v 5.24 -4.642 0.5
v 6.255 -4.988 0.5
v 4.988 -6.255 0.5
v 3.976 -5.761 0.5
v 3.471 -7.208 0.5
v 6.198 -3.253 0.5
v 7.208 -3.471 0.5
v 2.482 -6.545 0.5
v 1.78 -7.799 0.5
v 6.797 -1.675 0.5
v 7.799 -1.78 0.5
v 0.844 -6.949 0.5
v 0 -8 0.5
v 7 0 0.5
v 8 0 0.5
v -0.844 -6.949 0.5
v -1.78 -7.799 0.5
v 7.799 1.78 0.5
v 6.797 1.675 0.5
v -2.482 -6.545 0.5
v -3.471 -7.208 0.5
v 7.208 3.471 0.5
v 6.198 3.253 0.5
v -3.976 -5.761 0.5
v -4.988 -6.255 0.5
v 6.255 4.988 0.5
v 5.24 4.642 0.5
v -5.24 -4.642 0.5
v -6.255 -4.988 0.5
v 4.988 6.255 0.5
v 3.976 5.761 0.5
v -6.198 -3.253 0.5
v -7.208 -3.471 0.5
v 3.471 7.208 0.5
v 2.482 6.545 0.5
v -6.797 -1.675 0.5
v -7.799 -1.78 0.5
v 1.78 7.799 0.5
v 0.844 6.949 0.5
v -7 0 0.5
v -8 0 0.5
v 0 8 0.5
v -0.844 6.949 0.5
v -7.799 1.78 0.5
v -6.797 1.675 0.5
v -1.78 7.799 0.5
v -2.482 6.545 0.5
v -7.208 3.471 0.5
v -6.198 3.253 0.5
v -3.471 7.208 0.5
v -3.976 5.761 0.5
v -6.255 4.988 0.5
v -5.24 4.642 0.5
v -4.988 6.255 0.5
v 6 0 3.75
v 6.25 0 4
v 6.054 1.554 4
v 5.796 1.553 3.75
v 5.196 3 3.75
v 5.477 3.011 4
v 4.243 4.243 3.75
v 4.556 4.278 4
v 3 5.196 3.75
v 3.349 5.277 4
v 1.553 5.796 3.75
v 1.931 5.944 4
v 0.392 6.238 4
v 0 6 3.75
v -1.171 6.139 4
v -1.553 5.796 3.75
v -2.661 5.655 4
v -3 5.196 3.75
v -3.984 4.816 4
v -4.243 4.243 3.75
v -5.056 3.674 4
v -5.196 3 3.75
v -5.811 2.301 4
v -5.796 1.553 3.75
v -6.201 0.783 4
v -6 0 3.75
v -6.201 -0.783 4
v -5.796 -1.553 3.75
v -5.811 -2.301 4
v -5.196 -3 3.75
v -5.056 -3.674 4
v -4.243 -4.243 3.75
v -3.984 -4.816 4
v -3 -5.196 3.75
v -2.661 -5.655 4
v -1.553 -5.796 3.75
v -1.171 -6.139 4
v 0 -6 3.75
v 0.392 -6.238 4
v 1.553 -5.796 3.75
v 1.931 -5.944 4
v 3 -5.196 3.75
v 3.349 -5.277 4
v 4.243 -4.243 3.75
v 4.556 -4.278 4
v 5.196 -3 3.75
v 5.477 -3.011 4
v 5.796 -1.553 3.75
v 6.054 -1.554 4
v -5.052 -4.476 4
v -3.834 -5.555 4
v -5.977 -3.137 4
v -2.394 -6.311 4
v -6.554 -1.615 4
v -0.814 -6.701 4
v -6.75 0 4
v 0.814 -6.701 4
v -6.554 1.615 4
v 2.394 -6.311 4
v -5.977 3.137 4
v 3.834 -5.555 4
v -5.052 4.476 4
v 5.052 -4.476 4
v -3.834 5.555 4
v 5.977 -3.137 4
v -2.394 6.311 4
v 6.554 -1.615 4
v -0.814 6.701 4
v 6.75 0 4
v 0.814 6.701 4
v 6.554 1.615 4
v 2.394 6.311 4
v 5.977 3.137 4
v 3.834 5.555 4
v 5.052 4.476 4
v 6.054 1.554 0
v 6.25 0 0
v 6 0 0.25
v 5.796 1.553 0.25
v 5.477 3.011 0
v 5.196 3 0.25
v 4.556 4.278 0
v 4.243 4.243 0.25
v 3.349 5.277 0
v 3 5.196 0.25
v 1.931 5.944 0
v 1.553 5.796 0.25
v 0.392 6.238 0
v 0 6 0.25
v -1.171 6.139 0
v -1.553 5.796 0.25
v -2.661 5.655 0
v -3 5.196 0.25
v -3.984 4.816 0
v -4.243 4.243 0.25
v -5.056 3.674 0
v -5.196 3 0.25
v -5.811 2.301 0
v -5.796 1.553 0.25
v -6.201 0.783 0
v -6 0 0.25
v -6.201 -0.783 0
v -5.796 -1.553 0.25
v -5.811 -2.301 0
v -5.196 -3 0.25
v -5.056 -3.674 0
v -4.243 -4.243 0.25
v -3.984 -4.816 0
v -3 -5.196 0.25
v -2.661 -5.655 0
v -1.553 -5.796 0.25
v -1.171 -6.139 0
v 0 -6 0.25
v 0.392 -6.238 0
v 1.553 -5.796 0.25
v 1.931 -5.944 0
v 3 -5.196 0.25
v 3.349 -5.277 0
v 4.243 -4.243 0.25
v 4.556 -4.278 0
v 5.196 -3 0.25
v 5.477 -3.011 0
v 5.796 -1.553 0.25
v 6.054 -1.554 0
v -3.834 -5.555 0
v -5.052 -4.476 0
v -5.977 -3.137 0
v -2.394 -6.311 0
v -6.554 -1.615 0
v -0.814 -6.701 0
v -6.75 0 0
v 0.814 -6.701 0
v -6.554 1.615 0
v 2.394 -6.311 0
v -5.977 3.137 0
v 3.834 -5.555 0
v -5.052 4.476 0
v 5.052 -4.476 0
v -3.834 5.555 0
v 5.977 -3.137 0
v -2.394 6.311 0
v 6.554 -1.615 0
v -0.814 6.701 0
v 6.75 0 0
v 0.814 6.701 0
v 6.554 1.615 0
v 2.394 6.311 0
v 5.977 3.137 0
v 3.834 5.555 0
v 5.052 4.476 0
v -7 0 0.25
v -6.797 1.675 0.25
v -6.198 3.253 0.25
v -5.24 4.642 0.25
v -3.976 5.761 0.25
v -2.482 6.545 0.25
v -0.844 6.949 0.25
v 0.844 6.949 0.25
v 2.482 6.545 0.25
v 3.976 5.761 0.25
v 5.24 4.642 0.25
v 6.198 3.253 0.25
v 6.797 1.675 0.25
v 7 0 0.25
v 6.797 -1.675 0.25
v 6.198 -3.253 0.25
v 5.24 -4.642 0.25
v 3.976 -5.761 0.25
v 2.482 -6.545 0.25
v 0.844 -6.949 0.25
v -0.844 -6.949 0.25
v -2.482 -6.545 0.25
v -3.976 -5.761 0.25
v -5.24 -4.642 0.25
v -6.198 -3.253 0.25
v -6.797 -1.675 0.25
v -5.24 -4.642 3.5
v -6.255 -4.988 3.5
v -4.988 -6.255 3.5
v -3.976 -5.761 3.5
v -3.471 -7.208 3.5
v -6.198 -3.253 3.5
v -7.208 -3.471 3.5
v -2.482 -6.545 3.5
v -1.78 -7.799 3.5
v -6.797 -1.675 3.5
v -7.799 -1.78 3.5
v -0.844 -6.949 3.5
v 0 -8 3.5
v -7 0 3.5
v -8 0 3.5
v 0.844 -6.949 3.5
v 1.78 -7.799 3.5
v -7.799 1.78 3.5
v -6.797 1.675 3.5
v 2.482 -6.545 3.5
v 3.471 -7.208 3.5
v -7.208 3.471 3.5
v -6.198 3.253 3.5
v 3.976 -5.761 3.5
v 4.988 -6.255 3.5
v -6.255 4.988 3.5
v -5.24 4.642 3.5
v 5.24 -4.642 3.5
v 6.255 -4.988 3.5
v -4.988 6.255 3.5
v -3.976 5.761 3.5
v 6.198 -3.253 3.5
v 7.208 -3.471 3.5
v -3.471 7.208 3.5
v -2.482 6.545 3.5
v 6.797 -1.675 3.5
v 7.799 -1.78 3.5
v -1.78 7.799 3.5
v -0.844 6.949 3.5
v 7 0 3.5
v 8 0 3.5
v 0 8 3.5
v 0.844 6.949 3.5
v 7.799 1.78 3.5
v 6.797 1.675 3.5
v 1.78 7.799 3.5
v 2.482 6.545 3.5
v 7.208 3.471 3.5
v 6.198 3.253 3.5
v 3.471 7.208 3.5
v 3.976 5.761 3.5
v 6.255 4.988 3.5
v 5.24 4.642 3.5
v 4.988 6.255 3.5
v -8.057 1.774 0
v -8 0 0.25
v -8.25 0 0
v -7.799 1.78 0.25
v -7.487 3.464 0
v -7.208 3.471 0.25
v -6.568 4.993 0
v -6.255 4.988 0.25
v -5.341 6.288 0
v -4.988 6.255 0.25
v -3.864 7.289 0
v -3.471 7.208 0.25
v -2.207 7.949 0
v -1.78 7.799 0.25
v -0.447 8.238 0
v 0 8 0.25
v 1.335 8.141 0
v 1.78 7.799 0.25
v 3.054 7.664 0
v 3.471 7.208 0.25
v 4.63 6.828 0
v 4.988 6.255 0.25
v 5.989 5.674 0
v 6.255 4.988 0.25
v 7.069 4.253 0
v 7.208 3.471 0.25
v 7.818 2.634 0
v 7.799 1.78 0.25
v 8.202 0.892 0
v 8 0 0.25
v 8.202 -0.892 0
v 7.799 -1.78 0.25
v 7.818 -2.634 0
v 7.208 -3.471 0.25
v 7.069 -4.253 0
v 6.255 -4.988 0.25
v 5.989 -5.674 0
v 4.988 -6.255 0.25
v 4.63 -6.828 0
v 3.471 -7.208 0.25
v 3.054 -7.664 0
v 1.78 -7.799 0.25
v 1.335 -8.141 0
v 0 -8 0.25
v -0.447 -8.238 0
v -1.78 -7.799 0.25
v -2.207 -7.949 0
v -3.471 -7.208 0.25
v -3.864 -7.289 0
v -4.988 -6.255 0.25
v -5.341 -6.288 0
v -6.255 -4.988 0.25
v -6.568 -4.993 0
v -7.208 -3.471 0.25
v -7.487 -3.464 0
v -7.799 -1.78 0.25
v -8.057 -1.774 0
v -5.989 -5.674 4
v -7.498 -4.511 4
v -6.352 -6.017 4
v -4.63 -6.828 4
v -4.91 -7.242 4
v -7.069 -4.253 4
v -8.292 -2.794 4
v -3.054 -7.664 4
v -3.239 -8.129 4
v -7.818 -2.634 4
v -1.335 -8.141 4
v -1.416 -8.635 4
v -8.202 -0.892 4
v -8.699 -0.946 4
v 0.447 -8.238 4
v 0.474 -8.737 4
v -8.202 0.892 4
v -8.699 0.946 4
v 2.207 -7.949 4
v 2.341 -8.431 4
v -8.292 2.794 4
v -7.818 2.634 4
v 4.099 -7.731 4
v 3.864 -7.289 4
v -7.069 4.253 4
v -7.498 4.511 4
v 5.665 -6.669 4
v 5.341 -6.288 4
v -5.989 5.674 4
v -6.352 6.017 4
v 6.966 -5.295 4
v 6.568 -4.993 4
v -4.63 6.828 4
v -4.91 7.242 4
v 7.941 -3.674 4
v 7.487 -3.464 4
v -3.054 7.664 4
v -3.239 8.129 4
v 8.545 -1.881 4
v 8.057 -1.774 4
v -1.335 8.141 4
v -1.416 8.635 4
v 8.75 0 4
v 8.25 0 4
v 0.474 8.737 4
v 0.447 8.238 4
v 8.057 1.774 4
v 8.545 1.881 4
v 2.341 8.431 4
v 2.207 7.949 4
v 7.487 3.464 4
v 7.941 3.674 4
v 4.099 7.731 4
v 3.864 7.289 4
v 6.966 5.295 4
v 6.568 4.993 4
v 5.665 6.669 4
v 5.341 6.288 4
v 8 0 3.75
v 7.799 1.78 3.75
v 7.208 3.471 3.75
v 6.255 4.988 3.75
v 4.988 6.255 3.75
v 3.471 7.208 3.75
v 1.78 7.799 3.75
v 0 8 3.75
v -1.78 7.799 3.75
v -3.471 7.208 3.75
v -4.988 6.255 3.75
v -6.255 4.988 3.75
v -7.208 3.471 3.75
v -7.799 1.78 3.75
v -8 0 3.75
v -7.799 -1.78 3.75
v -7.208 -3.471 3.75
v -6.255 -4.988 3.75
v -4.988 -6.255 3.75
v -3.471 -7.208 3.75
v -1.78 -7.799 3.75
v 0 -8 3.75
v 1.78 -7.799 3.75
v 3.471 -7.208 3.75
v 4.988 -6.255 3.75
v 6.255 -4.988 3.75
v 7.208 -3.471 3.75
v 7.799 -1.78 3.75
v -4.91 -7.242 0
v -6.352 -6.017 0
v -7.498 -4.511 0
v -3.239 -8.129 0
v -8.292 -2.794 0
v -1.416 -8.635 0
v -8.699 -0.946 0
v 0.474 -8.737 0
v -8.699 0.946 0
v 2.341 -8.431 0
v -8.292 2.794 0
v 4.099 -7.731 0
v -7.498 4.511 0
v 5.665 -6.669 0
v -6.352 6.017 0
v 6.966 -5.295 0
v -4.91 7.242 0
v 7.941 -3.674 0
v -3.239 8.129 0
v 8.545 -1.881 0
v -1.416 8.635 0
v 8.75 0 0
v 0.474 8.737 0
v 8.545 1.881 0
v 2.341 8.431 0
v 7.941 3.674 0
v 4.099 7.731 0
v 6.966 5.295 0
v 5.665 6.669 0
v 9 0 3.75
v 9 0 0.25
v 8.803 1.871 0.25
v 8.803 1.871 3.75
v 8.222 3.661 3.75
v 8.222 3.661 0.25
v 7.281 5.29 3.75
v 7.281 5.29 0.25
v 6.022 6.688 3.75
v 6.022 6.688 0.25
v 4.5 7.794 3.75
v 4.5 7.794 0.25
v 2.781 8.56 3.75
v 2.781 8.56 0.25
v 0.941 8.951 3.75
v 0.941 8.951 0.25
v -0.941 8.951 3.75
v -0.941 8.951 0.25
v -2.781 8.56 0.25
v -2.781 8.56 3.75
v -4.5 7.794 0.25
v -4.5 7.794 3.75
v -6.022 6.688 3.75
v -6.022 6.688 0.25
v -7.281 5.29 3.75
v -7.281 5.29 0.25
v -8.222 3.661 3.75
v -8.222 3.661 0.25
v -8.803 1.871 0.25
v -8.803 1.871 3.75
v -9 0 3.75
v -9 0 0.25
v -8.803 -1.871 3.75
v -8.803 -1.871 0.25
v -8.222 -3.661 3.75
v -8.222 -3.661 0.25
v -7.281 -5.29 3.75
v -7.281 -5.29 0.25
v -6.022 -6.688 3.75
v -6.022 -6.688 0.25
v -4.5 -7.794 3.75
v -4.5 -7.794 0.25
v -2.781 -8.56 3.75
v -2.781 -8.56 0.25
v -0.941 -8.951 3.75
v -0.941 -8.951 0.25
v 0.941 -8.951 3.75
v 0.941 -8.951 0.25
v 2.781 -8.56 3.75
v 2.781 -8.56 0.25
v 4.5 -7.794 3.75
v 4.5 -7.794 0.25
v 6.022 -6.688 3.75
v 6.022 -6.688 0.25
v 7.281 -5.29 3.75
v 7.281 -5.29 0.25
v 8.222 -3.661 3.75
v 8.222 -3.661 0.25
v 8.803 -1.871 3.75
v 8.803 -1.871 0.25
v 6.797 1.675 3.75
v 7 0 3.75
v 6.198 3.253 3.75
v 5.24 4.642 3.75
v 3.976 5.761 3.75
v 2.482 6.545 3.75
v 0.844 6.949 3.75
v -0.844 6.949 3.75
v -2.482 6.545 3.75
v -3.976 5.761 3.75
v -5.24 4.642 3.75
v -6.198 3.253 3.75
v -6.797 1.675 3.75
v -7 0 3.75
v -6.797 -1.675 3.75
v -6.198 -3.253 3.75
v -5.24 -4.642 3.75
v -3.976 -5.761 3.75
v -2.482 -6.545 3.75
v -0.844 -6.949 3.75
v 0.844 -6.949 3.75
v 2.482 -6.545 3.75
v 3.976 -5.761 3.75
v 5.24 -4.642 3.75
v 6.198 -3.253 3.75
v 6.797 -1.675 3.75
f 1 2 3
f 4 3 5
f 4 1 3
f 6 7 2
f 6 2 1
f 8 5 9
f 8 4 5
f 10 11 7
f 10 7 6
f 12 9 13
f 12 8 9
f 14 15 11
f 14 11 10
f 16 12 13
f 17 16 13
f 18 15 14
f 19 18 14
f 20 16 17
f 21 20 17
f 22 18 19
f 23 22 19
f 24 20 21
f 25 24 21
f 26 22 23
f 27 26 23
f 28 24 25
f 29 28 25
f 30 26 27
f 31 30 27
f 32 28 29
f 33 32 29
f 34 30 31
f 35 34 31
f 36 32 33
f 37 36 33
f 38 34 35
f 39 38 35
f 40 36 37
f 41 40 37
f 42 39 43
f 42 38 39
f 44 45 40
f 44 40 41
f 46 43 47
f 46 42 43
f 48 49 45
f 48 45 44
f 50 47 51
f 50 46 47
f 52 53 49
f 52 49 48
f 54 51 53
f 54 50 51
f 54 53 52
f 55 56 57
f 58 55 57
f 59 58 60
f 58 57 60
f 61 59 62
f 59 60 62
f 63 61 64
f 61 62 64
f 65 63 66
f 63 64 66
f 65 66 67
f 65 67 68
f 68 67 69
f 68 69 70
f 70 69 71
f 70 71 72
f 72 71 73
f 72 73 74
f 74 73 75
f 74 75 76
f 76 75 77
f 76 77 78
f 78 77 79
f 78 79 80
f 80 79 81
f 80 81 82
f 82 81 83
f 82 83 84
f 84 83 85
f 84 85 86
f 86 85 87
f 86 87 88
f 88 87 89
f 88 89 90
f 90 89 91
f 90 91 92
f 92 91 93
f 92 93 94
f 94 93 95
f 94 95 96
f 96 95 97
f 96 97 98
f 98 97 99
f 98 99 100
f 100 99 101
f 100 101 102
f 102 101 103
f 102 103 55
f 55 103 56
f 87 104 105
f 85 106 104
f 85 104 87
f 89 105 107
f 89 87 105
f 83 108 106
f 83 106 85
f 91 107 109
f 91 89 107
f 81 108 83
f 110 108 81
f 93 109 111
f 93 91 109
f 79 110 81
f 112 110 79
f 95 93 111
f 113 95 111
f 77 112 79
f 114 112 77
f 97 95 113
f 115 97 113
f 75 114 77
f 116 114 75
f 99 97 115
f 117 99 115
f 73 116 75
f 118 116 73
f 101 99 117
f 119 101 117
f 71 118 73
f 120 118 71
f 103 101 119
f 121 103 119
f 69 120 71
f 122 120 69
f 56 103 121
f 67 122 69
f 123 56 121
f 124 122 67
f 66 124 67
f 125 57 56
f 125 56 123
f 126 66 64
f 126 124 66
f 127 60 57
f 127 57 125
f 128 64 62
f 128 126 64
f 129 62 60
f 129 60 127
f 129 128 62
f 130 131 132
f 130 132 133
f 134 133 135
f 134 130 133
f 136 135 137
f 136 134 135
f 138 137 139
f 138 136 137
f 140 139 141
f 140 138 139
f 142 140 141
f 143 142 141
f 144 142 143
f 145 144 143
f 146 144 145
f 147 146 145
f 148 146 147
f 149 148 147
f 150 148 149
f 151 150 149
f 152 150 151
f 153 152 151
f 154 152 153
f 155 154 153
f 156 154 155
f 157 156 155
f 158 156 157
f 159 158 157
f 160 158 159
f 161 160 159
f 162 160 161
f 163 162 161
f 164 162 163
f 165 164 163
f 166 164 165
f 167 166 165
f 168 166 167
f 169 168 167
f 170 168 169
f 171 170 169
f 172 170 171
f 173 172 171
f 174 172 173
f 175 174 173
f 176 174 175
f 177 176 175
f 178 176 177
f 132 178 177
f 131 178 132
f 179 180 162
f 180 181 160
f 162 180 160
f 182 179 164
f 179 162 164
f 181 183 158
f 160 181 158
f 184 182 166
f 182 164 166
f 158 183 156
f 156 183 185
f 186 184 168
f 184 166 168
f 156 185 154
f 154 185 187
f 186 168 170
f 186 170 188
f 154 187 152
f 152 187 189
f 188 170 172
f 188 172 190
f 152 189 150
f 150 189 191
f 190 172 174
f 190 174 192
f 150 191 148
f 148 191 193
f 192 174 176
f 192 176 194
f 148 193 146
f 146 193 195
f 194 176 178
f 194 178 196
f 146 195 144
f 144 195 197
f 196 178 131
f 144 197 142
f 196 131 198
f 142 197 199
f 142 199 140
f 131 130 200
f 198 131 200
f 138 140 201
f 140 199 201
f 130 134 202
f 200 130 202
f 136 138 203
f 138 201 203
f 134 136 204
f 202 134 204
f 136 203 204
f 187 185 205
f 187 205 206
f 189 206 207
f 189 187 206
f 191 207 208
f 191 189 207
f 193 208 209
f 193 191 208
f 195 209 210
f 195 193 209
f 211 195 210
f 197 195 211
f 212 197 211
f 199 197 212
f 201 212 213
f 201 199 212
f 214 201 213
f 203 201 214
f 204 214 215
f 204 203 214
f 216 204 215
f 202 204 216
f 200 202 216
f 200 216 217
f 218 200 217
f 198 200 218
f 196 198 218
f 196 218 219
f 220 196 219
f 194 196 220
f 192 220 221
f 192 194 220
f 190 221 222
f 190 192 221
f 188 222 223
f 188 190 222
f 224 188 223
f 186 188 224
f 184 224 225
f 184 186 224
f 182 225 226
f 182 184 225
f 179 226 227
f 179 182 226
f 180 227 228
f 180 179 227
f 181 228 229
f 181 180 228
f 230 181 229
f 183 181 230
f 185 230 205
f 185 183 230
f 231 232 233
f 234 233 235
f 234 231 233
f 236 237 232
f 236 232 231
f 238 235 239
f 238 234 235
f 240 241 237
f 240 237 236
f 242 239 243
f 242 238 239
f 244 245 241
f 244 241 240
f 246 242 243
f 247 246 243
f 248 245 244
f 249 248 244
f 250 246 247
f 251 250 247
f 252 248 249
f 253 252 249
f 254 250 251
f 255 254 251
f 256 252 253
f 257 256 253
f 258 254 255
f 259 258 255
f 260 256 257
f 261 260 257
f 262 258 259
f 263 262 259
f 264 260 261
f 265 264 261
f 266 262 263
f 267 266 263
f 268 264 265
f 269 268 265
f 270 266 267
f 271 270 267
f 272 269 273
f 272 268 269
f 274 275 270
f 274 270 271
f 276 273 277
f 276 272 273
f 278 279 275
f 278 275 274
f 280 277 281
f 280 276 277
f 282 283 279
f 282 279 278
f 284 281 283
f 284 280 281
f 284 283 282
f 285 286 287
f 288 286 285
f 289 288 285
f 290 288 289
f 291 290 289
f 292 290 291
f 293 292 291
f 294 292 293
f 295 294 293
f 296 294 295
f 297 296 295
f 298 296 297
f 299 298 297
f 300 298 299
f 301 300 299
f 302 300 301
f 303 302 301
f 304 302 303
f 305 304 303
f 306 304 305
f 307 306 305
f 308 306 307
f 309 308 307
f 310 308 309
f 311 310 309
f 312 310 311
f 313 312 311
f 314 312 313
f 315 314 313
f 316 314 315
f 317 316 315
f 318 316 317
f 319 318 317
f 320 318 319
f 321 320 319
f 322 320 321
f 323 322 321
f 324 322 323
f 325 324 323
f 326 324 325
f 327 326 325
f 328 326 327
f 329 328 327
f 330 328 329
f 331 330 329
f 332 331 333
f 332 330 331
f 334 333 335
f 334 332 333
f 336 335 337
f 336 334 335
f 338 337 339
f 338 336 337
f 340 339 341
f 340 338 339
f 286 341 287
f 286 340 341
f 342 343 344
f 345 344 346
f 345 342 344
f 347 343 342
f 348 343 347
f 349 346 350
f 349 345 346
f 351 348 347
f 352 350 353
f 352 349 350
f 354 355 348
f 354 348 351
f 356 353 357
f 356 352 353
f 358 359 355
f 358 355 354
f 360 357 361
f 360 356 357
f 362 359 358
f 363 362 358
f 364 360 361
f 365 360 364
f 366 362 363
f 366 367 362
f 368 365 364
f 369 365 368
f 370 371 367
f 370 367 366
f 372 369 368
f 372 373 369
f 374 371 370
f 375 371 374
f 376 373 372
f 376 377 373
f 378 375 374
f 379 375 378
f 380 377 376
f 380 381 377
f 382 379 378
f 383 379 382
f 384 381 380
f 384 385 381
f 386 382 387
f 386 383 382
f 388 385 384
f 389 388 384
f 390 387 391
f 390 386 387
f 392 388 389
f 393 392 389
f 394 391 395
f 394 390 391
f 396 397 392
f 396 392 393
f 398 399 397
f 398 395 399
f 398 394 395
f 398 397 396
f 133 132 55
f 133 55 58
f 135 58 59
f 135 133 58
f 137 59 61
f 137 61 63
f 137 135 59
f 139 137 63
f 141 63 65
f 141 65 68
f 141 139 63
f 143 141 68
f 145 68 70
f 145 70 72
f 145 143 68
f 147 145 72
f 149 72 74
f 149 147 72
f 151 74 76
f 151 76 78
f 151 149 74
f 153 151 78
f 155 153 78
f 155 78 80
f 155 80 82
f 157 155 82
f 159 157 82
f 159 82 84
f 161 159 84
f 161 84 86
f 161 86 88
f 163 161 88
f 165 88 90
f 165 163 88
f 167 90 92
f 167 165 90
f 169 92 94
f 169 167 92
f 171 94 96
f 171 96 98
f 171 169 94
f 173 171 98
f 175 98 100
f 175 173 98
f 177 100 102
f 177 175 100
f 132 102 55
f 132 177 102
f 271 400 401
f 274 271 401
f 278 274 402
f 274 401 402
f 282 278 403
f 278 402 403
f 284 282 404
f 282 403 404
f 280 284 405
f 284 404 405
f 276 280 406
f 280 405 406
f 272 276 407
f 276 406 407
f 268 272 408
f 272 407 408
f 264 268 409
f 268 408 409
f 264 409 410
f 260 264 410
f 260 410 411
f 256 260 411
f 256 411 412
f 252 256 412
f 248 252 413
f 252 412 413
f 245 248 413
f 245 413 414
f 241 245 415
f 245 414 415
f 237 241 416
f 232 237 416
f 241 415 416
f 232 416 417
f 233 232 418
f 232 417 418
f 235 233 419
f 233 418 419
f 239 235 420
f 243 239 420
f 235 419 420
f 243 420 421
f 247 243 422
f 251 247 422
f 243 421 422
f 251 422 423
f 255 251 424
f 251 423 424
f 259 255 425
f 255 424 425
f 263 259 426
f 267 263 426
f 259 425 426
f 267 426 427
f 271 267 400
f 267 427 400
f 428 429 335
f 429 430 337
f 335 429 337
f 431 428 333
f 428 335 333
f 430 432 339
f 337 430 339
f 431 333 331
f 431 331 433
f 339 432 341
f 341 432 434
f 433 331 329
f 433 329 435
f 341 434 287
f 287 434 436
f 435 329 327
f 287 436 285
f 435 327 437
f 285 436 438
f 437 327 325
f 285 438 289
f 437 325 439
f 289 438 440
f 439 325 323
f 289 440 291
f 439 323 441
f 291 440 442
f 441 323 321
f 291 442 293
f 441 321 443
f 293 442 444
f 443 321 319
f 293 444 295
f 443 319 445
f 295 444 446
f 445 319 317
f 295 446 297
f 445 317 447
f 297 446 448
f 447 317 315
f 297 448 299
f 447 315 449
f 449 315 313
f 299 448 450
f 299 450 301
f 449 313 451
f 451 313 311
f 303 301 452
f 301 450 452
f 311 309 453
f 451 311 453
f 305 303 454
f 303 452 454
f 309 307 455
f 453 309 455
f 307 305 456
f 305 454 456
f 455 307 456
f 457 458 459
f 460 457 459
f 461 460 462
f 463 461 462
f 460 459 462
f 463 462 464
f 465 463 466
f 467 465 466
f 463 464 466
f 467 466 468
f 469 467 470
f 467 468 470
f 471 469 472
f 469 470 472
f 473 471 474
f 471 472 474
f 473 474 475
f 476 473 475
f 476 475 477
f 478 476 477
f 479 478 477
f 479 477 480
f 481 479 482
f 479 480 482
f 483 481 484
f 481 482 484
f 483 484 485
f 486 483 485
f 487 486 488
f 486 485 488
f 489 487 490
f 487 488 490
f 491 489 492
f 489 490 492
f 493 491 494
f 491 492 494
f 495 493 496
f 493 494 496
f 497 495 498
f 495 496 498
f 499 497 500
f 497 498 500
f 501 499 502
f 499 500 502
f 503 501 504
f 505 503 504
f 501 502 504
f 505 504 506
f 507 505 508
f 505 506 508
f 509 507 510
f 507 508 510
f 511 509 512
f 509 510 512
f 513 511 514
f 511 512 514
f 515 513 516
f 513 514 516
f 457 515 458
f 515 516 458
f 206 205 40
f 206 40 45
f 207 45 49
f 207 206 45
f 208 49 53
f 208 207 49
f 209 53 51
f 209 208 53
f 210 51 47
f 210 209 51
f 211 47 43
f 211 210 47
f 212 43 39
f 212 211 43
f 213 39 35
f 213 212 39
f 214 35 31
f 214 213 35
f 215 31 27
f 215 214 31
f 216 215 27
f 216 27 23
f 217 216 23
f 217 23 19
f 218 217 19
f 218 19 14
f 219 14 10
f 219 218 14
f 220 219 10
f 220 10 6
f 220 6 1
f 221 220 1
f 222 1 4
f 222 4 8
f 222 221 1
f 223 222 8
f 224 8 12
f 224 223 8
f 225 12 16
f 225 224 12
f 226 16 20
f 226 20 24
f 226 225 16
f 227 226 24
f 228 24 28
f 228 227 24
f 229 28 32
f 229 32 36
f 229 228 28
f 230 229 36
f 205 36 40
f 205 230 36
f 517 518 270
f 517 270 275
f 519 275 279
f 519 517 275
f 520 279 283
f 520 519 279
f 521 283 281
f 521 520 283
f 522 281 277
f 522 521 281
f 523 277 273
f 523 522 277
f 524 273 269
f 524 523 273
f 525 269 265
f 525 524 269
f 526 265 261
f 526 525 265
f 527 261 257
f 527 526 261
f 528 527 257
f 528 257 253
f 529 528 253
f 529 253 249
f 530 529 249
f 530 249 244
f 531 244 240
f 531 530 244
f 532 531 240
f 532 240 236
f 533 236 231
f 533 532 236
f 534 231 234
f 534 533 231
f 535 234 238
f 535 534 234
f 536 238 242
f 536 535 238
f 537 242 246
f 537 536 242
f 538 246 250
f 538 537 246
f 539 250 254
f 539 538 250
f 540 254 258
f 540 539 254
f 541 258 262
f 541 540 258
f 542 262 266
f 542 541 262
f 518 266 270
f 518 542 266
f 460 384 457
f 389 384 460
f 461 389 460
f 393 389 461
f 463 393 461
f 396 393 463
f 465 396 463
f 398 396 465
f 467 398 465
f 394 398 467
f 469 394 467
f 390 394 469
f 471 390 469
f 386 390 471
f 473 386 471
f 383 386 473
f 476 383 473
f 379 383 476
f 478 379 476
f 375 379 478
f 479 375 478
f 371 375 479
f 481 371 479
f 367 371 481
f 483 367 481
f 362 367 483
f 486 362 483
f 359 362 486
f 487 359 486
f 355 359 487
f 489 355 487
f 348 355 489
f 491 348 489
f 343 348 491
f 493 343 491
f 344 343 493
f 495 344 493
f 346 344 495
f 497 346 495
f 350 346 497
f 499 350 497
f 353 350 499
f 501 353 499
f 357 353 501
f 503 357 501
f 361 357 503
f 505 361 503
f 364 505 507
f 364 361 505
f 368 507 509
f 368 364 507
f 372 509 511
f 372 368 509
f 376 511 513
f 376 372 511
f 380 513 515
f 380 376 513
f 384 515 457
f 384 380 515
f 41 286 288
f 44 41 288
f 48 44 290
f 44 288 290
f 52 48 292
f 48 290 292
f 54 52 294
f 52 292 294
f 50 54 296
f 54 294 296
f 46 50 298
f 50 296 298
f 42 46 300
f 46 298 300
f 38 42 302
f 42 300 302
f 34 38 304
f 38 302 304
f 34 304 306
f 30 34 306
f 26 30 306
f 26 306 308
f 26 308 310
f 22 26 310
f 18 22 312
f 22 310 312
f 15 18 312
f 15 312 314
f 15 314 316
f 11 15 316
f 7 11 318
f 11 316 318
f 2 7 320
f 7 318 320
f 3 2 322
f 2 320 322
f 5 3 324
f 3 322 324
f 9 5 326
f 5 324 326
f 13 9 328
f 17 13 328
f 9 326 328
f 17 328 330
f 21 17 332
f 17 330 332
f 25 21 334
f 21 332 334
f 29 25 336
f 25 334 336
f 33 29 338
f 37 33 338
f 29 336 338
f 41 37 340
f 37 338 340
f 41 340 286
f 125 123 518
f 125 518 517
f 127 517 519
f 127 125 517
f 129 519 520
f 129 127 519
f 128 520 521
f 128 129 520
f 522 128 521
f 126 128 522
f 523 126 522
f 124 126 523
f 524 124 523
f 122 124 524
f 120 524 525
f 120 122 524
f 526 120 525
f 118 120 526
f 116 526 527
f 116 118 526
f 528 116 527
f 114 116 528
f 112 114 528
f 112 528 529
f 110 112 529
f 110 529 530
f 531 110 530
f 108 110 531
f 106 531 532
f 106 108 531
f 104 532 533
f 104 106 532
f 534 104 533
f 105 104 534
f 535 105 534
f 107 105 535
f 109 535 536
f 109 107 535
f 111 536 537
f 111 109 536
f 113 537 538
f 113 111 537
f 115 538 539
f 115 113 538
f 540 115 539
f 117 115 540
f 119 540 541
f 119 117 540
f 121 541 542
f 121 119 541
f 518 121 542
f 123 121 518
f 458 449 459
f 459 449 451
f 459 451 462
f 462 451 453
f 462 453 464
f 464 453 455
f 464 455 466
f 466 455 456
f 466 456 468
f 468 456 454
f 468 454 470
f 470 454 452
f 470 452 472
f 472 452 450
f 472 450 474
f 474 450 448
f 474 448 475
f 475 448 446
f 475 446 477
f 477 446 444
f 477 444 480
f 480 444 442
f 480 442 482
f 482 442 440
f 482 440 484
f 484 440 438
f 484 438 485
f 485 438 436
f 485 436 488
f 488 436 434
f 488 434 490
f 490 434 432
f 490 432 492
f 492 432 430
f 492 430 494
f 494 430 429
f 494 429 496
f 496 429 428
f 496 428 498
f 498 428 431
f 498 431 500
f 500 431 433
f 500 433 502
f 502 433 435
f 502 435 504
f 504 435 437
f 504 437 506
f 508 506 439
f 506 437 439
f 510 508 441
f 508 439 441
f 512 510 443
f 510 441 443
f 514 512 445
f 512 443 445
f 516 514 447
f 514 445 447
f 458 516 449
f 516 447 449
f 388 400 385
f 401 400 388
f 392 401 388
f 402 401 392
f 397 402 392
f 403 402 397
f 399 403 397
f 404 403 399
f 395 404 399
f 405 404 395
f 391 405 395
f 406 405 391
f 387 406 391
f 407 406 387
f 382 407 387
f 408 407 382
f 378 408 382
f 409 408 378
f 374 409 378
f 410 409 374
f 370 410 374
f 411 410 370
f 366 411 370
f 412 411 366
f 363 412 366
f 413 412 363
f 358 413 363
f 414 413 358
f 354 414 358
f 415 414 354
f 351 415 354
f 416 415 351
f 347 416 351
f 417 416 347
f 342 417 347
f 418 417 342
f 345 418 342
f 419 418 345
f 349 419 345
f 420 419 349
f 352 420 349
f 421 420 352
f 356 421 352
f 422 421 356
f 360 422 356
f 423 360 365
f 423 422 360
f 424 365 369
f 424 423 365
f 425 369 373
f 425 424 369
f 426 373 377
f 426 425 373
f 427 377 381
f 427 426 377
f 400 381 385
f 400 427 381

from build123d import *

# Parameters (mm, degrees)
SKETCH2_R           = 9
SKETCH2_R_2         = 6
BOSS_EXTRUDE1_DEPTH = 4
CHAMFER2_SIZE       = 0.25
SKETCH3_R           = 8
SKETCH3_R_2         = 7
CUT_EXTRUDE2_DEPTH  = 0.5
SKETCH4_R           = 8
SKETCH4_R_2         = 7
CUT_EXTRUDE3_DEPTH  = 0.5
CHAMFER3_SIZE       = 0.25


with BuildPart() as part:
    # Sketch2 → Boss-Extrude1 (new body)
    with BuildSketch(Plane.XY):
        Circle(SKETCH2_R)
        Circle(SKETCH2_R_2, mode=Mode.SUBTRACT)
    extrude(amount=BOSS_EXTRUDE1_DEPTH)

    # Chamfer2
    chamfer2_edges = [part.edges().sort_by_distance(p)[0] for p in [
        (-9, 0, 0),
        (-9, 0, 4),
        (-6, 0, 0),
        (-6, 0, 4),
    ]]
    chamfer(chamfer2_edges, length=CHAMFER2_SIZE)

    # Sketch3 → Cut-Extrude2 (cut)
    with BuildSketch(Plane(origin=(0, 0, 0), x_dir=(-1, 0, 0), z_dir=(0, 0, -1))):
        Circle(SKETCH3_R)
        Circle(SKETCH3_R_2, mode=Mode.SUBTRACT)
    extrude(amount=-CUT_EXTRUDE2_DEPTH, mode=Mode.SUBTRACT)

    # Sketch4 → Cut-Extrude3 (cut)
    with BuildSketch(Plane.XY.offset(4)):
        Circle(SKETCH4_R)
        Circle(SKETCH4_R_2, mode=Mode.SUBTRACT)
    extrude(amount=-CUT_EXTRUDE3_DEPTH, mode=Mode.SUBTRACT)

    # Chamfer3
    chamfer3_edges = [part.edges().sort_by_distance(p)[0] for p in [
        (8, 0, 0),
        (7, 0, 0),
        (-8, 0, 4),
        (-7, 0, 4),
    ]]
    chamfer(chamfer3_edges, length=CHAMFER3_SIZE)


solid = part.part
